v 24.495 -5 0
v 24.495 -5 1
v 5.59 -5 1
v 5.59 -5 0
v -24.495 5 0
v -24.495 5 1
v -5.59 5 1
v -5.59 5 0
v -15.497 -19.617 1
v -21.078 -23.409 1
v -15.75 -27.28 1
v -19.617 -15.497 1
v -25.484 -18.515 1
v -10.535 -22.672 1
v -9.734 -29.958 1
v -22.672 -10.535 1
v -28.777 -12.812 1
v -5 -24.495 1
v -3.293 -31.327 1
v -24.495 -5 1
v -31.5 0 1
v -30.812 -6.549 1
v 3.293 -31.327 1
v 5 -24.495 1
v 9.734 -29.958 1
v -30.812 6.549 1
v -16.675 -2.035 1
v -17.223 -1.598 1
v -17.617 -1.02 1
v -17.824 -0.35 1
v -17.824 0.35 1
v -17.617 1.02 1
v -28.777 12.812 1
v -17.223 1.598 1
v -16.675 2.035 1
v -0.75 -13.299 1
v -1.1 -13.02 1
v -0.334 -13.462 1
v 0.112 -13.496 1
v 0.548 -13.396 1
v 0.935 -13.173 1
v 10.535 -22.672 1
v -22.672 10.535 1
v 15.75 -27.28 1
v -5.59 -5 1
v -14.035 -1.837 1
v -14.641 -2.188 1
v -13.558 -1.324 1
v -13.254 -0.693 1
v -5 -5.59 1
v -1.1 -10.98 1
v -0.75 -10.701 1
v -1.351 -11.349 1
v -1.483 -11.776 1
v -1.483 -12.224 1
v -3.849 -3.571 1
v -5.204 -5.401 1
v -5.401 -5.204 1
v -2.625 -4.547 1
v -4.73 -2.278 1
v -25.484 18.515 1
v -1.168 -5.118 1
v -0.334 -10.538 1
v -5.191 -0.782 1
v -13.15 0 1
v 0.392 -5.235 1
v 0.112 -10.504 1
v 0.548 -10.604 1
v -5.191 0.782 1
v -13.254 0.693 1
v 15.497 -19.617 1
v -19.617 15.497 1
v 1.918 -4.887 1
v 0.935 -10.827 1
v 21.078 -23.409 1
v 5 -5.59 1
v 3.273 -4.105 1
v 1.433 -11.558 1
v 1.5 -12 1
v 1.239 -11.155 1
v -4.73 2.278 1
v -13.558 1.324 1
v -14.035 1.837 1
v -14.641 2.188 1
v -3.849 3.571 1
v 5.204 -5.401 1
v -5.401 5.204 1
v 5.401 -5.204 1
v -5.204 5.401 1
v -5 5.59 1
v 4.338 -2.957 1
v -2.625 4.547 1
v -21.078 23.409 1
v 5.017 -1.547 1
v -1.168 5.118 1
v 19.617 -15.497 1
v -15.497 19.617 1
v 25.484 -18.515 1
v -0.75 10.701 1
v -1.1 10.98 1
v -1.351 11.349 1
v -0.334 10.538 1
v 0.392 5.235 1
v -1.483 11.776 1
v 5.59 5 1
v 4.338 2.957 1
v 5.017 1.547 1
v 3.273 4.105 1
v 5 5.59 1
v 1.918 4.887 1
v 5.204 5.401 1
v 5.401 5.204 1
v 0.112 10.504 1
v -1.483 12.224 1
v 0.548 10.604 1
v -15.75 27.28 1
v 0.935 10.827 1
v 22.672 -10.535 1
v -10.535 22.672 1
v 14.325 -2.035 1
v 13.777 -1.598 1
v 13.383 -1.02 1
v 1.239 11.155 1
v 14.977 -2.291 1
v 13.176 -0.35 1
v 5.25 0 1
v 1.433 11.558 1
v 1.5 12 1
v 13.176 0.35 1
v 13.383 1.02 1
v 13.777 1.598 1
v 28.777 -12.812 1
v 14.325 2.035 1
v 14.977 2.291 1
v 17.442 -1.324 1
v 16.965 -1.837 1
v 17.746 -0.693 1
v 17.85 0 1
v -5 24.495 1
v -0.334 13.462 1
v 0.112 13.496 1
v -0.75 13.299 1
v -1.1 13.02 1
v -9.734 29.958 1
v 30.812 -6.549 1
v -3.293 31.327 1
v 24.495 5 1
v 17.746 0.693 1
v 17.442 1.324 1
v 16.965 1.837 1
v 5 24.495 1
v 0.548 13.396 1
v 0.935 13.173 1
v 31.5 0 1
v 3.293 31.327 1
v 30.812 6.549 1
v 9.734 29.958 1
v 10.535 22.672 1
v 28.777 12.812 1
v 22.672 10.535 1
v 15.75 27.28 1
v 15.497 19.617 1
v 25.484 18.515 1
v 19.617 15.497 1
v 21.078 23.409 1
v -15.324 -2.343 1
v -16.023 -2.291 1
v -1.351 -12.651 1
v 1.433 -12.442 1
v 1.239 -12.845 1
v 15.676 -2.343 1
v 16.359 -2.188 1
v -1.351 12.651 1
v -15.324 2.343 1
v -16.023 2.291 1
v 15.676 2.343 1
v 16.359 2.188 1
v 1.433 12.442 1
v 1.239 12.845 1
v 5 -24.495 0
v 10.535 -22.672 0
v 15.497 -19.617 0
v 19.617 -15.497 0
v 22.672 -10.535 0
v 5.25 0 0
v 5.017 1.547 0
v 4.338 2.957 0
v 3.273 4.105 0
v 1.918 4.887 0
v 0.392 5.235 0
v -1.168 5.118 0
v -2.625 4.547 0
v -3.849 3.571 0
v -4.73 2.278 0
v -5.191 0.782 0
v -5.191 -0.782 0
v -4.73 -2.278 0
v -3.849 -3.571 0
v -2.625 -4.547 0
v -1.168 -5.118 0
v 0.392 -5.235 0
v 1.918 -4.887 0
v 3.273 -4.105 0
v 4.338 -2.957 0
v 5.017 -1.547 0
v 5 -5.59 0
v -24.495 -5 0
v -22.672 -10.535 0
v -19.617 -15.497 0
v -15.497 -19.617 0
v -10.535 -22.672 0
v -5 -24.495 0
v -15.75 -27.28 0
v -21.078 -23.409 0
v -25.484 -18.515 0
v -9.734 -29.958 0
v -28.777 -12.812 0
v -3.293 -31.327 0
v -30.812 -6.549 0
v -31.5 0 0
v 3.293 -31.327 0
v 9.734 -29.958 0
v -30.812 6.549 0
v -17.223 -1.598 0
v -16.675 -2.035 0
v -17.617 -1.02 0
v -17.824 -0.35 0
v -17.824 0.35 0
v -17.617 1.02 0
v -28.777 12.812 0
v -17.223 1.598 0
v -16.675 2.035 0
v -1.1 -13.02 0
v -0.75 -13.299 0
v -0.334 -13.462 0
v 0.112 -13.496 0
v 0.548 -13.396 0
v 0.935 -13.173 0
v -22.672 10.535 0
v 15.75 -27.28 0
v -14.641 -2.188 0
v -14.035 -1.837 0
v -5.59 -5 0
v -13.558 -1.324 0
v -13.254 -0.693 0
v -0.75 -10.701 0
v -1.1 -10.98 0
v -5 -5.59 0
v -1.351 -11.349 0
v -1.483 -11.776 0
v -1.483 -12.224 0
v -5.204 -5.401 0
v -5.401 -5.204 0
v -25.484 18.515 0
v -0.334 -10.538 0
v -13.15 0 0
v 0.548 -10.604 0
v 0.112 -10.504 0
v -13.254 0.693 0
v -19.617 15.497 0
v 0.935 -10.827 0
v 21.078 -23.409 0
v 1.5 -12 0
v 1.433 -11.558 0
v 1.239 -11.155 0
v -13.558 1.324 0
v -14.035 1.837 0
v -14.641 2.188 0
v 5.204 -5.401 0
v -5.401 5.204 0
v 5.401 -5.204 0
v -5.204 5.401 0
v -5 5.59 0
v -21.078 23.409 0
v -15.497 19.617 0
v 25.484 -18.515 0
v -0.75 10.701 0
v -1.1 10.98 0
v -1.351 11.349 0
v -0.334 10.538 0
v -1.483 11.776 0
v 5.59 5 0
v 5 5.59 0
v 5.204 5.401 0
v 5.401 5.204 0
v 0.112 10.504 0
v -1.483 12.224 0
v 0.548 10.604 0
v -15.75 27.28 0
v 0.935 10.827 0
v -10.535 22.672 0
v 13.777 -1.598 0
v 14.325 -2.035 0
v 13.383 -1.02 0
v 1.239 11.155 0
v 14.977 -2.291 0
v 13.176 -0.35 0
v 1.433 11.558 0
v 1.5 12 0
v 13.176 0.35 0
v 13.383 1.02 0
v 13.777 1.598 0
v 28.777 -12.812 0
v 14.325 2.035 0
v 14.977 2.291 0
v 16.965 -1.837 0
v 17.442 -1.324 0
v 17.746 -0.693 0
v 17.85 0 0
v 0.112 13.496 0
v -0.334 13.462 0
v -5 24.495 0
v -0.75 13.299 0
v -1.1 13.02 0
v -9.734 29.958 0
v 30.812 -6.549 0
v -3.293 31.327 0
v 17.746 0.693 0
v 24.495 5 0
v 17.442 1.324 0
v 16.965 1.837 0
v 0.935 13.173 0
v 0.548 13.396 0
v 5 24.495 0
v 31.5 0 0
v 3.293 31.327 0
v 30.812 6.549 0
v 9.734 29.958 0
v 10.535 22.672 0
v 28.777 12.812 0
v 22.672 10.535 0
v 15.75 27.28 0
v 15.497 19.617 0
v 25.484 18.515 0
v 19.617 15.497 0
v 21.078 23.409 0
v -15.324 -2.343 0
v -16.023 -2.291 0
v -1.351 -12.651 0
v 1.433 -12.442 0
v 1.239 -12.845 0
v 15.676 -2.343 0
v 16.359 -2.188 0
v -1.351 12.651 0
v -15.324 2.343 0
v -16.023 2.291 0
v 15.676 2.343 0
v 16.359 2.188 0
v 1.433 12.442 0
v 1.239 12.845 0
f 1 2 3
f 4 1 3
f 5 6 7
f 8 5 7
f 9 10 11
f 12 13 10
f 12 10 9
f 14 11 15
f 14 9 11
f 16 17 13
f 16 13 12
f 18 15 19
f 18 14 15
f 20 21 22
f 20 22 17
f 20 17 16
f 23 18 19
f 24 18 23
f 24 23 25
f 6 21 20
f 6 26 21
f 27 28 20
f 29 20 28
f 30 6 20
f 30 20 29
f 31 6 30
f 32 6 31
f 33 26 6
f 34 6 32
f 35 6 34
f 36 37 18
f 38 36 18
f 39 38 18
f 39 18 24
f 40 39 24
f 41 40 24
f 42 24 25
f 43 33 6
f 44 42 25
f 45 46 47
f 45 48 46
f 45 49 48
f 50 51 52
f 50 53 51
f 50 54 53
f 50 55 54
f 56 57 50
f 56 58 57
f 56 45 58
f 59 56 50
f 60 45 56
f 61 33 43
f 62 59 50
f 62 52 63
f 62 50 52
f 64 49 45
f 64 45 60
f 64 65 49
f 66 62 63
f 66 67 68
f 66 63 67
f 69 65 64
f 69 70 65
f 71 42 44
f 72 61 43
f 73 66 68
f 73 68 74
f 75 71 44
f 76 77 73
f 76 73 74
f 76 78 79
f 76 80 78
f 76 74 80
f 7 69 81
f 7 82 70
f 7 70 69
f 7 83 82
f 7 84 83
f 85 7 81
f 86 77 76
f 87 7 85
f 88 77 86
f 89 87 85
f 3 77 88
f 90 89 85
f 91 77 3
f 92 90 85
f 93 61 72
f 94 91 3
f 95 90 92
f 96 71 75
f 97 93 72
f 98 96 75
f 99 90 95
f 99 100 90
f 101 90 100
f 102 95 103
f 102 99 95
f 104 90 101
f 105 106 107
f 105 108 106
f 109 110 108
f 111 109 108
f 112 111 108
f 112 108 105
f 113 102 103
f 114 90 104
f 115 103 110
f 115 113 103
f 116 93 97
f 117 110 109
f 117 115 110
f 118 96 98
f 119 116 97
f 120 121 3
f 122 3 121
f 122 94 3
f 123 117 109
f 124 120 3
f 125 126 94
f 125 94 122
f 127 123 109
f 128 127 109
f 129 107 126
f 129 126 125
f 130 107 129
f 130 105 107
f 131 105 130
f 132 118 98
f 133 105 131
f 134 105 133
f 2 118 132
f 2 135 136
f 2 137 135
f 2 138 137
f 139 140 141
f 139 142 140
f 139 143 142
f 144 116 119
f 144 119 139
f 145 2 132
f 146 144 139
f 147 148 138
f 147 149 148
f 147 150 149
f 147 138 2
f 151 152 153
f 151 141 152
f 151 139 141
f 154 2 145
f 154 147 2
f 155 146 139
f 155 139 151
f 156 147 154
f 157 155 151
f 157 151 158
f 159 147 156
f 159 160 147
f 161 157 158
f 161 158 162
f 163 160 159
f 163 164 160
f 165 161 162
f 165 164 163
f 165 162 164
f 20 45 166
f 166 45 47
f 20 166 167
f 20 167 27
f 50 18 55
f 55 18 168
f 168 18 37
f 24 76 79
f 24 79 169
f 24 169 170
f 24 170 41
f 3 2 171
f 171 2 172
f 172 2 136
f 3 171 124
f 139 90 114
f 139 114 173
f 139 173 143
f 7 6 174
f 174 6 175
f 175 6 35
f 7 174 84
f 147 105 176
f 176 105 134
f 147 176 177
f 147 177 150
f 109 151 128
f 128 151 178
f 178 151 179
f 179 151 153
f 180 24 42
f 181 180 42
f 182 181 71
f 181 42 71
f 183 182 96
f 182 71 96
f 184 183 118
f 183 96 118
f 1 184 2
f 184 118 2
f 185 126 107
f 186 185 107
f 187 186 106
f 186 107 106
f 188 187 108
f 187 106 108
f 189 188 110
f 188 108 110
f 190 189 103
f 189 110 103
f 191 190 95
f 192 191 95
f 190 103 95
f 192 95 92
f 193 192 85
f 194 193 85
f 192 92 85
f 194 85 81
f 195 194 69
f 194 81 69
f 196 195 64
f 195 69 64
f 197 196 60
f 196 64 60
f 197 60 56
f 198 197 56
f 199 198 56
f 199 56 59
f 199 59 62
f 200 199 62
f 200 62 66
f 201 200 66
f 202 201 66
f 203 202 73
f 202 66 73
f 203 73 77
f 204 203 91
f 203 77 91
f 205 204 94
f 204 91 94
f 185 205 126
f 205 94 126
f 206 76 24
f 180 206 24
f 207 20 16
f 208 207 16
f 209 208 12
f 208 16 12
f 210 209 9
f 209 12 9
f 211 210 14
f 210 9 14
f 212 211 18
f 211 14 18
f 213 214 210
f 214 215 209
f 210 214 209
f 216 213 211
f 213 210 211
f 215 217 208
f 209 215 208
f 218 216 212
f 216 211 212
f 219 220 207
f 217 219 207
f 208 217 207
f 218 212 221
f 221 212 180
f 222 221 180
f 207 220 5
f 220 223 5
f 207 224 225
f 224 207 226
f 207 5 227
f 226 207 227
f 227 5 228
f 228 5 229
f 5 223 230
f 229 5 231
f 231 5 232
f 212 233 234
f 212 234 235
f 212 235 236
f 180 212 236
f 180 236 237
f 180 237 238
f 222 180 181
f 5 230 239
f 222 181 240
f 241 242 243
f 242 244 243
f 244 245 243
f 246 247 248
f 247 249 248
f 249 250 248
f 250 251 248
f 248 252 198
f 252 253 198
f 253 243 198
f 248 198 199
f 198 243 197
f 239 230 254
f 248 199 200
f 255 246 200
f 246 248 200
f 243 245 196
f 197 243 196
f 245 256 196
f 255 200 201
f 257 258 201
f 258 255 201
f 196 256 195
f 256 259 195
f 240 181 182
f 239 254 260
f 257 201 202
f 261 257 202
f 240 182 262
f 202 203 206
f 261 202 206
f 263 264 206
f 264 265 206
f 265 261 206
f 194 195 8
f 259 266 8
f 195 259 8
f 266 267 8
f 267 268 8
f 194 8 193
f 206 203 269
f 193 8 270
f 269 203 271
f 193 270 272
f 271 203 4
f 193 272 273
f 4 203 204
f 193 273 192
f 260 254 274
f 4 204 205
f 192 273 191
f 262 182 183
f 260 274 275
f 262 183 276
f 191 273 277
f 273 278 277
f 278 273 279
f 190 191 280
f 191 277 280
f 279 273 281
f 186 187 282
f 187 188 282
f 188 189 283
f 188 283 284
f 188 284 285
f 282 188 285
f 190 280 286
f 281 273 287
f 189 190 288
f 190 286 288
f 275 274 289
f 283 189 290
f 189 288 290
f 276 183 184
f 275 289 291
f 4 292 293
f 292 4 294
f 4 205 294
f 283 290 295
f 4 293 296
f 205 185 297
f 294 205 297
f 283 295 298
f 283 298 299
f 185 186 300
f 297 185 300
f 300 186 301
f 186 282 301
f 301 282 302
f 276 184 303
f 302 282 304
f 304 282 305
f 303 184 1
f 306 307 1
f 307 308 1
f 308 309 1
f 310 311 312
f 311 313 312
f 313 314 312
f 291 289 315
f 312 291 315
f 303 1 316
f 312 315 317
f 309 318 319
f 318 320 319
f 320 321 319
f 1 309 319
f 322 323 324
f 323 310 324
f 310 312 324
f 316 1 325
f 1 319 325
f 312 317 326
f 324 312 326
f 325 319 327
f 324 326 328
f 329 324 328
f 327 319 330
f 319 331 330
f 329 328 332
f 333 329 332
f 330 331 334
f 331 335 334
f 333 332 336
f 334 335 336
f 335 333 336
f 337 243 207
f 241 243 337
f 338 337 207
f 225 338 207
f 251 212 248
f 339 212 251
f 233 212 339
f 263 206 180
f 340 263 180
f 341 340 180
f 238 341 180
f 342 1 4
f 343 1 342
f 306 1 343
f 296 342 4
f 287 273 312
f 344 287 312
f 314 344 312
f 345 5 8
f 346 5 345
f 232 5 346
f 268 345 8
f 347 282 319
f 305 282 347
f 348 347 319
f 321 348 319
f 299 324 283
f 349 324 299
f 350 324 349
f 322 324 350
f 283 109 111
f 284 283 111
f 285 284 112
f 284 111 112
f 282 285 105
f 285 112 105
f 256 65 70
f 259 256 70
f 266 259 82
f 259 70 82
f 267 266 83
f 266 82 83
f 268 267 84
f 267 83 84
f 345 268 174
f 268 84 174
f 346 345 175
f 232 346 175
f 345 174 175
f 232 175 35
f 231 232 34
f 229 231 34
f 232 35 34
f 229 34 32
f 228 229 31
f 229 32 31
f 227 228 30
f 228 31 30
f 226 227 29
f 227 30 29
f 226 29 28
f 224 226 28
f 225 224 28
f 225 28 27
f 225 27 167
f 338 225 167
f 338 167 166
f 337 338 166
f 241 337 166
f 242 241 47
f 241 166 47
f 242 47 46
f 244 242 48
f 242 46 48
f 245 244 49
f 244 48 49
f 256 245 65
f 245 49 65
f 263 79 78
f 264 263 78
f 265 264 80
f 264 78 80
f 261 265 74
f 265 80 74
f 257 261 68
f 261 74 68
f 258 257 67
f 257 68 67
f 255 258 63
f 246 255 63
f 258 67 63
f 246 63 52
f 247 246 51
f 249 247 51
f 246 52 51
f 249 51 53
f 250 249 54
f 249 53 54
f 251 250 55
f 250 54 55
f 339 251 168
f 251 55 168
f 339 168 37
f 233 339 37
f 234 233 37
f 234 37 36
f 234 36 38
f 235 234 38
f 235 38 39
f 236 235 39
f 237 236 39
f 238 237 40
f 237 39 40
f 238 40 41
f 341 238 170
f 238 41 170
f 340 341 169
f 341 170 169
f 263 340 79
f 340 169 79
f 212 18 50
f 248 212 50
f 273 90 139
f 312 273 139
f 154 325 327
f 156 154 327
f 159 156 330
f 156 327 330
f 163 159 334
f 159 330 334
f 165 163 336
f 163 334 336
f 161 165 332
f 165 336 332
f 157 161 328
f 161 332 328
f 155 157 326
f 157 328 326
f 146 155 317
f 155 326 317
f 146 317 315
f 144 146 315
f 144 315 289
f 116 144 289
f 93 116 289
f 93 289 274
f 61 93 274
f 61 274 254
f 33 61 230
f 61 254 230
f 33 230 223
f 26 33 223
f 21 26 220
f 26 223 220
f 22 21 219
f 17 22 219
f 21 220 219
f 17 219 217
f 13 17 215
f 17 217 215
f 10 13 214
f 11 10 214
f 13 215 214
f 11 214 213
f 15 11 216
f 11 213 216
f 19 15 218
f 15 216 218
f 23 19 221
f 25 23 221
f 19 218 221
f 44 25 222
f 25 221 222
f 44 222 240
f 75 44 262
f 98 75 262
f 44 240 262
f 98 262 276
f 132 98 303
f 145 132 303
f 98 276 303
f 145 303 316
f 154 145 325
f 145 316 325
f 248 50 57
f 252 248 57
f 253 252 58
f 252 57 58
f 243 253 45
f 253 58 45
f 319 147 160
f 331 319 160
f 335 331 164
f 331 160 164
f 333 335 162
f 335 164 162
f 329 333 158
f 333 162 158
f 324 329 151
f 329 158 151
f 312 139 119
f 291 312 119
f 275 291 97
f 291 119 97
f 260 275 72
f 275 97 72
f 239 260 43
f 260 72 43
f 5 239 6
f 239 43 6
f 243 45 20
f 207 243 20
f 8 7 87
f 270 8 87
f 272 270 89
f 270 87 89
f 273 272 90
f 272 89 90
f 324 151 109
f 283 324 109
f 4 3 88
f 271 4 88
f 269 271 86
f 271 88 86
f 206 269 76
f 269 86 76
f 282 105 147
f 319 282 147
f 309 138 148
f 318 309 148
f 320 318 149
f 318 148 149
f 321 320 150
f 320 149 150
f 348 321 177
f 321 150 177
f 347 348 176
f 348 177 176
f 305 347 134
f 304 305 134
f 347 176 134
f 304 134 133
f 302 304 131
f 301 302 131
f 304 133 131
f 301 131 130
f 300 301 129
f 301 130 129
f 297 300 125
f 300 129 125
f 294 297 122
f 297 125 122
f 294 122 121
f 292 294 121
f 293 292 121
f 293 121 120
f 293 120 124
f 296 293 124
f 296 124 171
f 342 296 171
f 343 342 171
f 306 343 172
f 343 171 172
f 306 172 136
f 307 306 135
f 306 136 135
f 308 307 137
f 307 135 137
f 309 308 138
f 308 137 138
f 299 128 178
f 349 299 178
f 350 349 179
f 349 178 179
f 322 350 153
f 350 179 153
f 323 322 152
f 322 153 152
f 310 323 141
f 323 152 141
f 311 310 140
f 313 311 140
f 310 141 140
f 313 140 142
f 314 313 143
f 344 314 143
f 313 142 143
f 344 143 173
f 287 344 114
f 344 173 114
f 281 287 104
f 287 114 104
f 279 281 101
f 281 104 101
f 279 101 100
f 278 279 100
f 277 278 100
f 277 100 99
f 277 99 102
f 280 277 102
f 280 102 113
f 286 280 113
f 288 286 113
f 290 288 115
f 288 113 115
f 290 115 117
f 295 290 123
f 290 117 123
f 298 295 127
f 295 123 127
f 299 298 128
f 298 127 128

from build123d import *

# Parameters (mm, degrees)
F0_R     = 31.5
F1_DEPTH = 1
F2_R     = 5.25
F3_DEPTH = 1
F4_R     = 1.5
F4_R_2   = 2.35
F5_DEPTH = 1


with BuildPart() as f1:
    # F0 (on Top) → F1 (new body)
    with BuildSketch(Plane.XY):
        Circle(F0_R)
    extrude(amount=F1_DEPTH)

    # F2 (on face) → F3 (cut, through all)
    with BuildSketch(Plane.XY.offset(1)):
        Circle(F2_R)
    extrude(amount=-F3_DEPTH, mode=Mode.SUBTRACT)

    # F4 (on face) → F5 (cut, through all)
    with BuildSketch(Plane.XY.offset(1)):
        with BuildLine():
            Line((-5, 5.59017), (-5, 24.494897))
            ThreePointArc((-5, 24.494897), (-17.67767, 17.67767), (-24.494897, 5))
            Line((-24.494897, 5), (-5.59017, 5))
            ThreePointArc((-5.59017, 5), (-5.303301, 5.303301), (-5, 5.59017))
        make_face()
        with BuildLine():
            Line((5.59017, 5), (24.494897, 5))
            ThreePointArc((24.494897, 5), (17.67767, 17.67767), (5, 24.494897))
            Line((5, 24.494897), (5, 5.59017))
            ThreePointArc((5, 5.59017), (5.303301, 5.303301), (5.59017, 5))
        make_face()
        with BuildLine():
            ThreePointArc((5, -24.494897), (17.67767, -17.67767), (24.494897, -5))
            Line((24.494897, -5), (5.59017, -5))
            ThreePointArc((5.59017, -5), (5.303301, -5.303301), (5, -5.59017))
            Line((5, -5.59017), (5, -24.494897))
        make_face()
        with BuildLine():
            ThreePointArc((-24.494897, -5), (-17.67767, -17.67767), (-5, -24.494897))
            Line((-5, -24.494897), (-5, -5.59017))
            ThreePointArc((-5, -5.59017), (-5.303301, -5.303301), (-5.59017, -5))
            Line((-5.59017, -5), (-24.494897, -5))
        make_face()
        with Locations((0, -12)):
            Circle(F4_R)
        with Locations((15.5, 0)):
            Circle(F4_R_2)
        with Locations((0, 12)):
            Circle(F4_R)
        with Locations((-15.5, 0)):
            Circle(F4_R_2)
    extrude(amount=-F5_DEPTH, mode=Mode.SUBTRACT)


solid = f1.part
